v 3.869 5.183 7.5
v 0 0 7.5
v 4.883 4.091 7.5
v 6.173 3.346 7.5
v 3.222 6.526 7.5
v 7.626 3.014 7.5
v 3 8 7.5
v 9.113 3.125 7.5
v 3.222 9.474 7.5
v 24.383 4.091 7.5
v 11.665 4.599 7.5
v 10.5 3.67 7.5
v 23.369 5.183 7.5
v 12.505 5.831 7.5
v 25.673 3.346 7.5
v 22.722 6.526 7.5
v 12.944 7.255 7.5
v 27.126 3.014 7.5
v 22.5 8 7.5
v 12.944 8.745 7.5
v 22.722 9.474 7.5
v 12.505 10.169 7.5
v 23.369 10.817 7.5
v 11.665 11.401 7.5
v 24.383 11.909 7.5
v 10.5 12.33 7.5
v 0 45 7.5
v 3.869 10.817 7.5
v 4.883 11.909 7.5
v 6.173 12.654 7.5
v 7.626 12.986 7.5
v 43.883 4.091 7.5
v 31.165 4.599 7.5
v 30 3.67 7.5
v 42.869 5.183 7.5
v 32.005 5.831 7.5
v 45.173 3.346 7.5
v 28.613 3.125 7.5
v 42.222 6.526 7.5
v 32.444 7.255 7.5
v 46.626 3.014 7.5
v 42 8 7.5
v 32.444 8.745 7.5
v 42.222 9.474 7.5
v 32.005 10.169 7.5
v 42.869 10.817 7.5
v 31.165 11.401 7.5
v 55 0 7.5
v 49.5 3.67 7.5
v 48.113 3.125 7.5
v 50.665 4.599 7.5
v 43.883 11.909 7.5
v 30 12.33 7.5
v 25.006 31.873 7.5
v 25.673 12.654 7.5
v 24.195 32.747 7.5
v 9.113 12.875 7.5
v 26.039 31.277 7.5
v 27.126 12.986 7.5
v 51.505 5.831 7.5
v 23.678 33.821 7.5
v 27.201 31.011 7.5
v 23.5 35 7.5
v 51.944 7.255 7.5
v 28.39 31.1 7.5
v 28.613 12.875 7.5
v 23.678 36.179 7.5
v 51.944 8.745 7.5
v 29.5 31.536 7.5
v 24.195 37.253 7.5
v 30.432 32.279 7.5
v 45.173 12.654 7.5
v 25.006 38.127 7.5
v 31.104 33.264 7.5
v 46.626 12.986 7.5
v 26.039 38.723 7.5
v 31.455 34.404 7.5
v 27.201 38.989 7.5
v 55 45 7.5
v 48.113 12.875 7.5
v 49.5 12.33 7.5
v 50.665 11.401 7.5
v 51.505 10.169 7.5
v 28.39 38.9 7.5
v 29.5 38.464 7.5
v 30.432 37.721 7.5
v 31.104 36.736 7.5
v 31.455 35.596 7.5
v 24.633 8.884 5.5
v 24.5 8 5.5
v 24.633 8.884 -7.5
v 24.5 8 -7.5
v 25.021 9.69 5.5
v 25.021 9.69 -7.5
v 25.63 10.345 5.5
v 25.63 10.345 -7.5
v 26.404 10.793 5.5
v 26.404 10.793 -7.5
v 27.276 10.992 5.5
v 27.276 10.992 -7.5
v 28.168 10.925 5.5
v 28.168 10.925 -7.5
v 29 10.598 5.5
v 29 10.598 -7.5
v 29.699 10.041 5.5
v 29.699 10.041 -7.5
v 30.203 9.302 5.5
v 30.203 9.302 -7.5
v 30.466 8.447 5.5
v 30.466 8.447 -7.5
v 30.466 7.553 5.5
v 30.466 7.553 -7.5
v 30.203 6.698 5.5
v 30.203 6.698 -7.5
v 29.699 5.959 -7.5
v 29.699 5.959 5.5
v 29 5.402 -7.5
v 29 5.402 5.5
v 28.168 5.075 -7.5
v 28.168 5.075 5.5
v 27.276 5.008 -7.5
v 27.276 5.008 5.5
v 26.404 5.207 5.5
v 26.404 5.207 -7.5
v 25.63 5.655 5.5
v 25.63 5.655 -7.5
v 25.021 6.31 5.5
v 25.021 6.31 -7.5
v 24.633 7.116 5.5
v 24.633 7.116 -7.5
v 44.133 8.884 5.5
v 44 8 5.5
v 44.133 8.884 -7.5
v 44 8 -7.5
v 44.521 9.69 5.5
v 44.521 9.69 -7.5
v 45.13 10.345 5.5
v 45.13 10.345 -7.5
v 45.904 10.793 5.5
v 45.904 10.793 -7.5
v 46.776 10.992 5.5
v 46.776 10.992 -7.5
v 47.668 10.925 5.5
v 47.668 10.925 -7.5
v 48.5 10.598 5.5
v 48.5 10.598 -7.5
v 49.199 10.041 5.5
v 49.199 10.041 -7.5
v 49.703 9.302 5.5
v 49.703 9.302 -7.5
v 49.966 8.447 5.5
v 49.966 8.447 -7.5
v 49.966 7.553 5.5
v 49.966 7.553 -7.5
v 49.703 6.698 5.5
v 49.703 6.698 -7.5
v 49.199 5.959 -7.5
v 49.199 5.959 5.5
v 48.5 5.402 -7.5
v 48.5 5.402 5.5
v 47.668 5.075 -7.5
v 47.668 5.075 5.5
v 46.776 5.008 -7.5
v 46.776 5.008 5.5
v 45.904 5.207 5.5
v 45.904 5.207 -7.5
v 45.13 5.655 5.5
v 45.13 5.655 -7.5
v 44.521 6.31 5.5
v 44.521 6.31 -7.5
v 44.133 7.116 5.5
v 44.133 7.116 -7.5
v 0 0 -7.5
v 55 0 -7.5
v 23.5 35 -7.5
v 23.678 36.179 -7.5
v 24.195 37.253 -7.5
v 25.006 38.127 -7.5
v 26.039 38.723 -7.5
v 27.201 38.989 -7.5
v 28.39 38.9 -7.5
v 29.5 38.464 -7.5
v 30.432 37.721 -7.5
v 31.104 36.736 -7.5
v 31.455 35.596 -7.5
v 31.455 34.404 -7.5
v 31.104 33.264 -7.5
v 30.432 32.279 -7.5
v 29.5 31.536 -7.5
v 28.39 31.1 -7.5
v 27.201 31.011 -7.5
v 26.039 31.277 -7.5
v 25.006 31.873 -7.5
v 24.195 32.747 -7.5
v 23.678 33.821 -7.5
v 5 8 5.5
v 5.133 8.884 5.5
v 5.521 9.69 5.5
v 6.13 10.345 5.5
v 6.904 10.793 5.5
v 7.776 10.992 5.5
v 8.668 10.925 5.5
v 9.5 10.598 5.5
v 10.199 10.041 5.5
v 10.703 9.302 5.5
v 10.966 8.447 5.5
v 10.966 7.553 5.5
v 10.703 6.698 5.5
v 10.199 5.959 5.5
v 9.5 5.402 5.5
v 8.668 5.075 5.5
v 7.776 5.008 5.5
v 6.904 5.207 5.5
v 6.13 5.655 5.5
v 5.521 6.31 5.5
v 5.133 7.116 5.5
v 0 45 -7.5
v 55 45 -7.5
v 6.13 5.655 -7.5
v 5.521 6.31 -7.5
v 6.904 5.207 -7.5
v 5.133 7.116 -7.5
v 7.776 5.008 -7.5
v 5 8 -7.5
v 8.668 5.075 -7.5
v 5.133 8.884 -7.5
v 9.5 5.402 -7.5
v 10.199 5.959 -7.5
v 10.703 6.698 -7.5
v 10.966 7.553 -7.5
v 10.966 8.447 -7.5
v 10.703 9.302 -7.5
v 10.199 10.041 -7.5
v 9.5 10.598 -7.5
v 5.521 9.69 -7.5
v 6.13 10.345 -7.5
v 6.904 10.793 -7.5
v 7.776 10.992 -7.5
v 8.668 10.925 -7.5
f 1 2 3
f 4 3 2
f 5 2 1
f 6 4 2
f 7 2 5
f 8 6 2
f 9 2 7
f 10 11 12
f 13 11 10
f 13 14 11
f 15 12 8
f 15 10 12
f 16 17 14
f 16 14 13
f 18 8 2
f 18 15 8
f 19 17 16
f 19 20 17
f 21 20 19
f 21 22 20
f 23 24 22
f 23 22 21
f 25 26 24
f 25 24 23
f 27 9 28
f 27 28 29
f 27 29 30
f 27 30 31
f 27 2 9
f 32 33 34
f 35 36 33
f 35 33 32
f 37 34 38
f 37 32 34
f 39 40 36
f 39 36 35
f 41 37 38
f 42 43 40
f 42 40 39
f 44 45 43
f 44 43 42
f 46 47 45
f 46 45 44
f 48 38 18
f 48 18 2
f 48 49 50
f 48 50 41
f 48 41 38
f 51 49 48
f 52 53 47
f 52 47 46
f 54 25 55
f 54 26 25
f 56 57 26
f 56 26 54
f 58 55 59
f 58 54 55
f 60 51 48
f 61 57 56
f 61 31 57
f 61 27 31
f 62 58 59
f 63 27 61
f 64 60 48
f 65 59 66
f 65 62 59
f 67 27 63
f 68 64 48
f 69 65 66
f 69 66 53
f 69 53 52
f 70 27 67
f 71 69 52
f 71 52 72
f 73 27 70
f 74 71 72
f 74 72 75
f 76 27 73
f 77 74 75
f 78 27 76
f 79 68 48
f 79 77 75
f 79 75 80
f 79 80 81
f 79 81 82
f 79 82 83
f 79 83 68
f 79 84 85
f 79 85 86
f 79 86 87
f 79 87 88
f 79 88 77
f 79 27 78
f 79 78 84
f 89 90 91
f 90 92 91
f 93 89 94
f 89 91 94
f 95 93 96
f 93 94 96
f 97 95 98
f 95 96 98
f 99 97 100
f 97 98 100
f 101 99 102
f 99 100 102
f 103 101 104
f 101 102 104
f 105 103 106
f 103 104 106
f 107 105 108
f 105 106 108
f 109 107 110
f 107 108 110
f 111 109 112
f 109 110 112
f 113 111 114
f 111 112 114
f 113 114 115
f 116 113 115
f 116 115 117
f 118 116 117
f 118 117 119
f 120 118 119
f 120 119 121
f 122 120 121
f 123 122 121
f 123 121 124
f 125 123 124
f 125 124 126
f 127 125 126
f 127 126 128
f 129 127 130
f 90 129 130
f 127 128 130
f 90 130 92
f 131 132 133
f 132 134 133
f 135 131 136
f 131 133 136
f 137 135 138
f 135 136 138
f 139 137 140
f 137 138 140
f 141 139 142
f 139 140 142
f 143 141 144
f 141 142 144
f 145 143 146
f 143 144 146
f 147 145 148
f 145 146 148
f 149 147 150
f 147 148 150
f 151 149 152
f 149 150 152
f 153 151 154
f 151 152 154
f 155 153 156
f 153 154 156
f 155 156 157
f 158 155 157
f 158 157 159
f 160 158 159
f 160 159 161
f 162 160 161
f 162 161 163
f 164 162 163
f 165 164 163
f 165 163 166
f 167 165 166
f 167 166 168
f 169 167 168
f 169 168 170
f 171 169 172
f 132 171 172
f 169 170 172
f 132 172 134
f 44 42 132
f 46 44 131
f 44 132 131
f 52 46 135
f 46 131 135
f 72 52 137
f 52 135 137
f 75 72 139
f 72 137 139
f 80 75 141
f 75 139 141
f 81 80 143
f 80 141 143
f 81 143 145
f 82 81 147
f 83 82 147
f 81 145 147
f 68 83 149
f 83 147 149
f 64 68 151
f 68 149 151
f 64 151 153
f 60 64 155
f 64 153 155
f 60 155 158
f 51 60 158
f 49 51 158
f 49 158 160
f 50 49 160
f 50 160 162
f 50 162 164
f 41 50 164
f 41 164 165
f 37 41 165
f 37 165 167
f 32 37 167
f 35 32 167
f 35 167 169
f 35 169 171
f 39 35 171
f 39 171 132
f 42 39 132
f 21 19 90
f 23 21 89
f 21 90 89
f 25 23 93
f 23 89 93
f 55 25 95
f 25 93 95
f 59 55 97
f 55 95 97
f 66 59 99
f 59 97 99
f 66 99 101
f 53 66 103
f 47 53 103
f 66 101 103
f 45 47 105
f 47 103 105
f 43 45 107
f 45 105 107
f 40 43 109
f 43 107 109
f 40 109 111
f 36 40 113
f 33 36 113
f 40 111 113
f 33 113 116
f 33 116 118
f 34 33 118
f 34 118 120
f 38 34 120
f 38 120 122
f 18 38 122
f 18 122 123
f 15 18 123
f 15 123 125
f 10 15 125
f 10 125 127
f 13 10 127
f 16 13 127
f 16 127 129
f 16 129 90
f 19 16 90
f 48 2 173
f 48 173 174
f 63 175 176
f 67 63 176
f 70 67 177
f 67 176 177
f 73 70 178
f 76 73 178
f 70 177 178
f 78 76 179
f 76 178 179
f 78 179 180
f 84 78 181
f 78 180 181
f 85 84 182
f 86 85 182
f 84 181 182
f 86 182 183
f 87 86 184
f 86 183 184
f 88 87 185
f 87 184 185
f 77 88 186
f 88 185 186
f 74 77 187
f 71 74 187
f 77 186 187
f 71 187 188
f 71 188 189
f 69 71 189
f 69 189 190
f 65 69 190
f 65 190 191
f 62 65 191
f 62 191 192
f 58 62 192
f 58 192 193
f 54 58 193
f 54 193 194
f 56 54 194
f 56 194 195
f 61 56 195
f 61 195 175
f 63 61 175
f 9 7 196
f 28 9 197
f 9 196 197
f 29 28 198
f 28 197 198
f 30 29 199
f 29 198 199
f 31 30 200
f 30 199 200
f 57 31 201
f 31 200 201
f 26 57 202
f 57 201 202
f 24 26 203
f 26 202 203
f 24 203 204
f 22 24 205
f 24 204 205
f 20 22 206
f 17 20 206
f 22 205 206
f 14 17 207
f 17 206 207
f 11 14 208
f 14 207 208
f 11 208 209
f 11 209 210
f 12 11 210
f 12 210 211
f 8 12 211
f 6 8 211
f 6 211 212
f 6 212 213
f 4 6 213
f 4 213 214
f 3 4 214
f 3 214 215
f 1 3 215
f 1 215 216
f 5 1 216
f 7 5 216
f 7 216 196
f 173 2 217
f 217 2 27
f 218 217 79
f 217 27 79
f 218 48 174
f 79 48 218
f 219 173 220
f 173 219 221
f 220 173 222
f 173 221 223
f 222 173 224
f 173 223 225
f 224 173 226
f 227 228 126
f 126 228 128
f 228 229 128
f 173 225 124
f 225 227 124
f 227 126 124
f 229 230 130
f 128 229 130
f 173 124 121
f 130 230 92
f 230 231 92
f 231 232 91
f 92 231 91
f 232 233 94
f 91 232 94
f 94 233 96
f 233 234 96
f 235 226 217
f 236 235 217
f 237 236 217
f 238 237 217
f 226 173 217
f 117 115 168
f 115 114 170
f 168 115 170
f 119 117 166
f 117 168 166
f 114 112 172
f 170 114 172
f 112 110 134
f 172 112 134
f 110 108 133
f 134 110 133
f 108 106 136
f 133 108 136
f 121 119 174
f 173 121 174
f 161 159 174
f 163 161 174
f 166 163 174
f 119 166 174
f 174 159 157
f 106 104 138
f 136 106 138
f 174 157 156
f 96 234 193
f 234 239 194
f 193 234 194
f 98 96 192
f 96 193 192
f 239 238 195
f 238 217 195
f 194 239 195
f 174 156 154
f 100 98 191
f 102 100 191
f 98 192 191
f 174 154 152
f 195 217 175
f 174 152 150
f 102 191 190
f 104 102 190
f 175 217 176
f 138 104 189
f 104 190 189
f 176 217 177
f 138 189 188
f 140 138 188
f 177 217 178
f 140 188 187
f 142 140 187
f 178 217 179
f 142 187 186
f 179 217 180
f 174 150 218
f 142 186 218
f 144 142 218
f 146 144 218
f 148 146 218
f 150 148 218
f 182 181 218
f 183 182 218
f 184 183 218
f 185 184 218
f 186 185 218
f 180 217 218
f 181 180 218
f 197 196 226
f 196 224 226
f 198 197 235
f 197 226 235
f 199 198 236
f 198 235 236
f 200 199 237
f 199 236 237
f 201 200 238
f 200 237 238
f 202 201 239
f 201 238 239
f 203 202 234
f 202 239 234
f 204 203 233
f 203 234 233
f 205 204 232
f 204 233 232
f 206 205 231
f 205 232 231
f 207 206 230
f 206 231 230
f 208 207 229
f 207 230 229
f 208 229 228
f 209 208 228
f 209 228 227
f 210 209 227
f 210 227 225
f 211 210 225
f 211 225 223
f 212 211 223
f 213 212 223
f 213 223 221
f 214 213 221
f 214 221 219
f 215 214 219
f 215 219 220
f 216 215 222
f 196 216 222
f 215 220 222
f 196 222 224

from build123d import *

# Parameters (mm, degrees)
SKETCH1_W                       = 55
SKETCH1_H                       = 45
BOSS_EXTRUDE1_DEPTH             = 7.5
F_6_0MM_DOWEL_HOLE1_D           = 6
F_6_0MM_DOWEL_HOLE1_CSINK_D     = 10
F_6_0MM_DOWEL_HOLE1_CSINK_ANGLE = 90
F_8_0MM_DOWEL_HOLE1_D           = 8


with BuildPart() as part:
    # Sketch1 → Boss-Extrude1 (new body, symmetric)
    with BuildSketch(Plane.XY):
        with Locations((27.5, 22.5)):
            Rectangle(SKETCH1_W, SKETCH1_H)
    extrude(amount=BOSS_EXTRUDE1_DEPTH, both=True)

    # Ø6.0mm Dowel Hole1 (through all)
    with Locations(Plane(origin=(8, 8, 7.5), x_dir=(1, 0, 0), z_dir=(0, 0, 1))):
        with Locations((0, 0), (19.5, 0), (39, 0)):
            CounterSinkHole(F_6_0MM_DOWEL_HOLE1_D / 2, F_6_0MM_DOWEL_HOLE1_CSINK_D / 2, counter_sink_angle=F_6_0MM_DOWEL_HOLE1_CSINK_ANGLE)

    # Ø8.0mm Dowel Hole1 (through all)
    with Locations(Plane(origin=(27.5, 35, 7.5), x_dir=(1, 0, 0), z_dir=(0, 0, 1))):
        with Locations((0, 0)):
            Hole(F_8_0MM_DOWEL_HOLE1_D / 2)


solid = part.part
